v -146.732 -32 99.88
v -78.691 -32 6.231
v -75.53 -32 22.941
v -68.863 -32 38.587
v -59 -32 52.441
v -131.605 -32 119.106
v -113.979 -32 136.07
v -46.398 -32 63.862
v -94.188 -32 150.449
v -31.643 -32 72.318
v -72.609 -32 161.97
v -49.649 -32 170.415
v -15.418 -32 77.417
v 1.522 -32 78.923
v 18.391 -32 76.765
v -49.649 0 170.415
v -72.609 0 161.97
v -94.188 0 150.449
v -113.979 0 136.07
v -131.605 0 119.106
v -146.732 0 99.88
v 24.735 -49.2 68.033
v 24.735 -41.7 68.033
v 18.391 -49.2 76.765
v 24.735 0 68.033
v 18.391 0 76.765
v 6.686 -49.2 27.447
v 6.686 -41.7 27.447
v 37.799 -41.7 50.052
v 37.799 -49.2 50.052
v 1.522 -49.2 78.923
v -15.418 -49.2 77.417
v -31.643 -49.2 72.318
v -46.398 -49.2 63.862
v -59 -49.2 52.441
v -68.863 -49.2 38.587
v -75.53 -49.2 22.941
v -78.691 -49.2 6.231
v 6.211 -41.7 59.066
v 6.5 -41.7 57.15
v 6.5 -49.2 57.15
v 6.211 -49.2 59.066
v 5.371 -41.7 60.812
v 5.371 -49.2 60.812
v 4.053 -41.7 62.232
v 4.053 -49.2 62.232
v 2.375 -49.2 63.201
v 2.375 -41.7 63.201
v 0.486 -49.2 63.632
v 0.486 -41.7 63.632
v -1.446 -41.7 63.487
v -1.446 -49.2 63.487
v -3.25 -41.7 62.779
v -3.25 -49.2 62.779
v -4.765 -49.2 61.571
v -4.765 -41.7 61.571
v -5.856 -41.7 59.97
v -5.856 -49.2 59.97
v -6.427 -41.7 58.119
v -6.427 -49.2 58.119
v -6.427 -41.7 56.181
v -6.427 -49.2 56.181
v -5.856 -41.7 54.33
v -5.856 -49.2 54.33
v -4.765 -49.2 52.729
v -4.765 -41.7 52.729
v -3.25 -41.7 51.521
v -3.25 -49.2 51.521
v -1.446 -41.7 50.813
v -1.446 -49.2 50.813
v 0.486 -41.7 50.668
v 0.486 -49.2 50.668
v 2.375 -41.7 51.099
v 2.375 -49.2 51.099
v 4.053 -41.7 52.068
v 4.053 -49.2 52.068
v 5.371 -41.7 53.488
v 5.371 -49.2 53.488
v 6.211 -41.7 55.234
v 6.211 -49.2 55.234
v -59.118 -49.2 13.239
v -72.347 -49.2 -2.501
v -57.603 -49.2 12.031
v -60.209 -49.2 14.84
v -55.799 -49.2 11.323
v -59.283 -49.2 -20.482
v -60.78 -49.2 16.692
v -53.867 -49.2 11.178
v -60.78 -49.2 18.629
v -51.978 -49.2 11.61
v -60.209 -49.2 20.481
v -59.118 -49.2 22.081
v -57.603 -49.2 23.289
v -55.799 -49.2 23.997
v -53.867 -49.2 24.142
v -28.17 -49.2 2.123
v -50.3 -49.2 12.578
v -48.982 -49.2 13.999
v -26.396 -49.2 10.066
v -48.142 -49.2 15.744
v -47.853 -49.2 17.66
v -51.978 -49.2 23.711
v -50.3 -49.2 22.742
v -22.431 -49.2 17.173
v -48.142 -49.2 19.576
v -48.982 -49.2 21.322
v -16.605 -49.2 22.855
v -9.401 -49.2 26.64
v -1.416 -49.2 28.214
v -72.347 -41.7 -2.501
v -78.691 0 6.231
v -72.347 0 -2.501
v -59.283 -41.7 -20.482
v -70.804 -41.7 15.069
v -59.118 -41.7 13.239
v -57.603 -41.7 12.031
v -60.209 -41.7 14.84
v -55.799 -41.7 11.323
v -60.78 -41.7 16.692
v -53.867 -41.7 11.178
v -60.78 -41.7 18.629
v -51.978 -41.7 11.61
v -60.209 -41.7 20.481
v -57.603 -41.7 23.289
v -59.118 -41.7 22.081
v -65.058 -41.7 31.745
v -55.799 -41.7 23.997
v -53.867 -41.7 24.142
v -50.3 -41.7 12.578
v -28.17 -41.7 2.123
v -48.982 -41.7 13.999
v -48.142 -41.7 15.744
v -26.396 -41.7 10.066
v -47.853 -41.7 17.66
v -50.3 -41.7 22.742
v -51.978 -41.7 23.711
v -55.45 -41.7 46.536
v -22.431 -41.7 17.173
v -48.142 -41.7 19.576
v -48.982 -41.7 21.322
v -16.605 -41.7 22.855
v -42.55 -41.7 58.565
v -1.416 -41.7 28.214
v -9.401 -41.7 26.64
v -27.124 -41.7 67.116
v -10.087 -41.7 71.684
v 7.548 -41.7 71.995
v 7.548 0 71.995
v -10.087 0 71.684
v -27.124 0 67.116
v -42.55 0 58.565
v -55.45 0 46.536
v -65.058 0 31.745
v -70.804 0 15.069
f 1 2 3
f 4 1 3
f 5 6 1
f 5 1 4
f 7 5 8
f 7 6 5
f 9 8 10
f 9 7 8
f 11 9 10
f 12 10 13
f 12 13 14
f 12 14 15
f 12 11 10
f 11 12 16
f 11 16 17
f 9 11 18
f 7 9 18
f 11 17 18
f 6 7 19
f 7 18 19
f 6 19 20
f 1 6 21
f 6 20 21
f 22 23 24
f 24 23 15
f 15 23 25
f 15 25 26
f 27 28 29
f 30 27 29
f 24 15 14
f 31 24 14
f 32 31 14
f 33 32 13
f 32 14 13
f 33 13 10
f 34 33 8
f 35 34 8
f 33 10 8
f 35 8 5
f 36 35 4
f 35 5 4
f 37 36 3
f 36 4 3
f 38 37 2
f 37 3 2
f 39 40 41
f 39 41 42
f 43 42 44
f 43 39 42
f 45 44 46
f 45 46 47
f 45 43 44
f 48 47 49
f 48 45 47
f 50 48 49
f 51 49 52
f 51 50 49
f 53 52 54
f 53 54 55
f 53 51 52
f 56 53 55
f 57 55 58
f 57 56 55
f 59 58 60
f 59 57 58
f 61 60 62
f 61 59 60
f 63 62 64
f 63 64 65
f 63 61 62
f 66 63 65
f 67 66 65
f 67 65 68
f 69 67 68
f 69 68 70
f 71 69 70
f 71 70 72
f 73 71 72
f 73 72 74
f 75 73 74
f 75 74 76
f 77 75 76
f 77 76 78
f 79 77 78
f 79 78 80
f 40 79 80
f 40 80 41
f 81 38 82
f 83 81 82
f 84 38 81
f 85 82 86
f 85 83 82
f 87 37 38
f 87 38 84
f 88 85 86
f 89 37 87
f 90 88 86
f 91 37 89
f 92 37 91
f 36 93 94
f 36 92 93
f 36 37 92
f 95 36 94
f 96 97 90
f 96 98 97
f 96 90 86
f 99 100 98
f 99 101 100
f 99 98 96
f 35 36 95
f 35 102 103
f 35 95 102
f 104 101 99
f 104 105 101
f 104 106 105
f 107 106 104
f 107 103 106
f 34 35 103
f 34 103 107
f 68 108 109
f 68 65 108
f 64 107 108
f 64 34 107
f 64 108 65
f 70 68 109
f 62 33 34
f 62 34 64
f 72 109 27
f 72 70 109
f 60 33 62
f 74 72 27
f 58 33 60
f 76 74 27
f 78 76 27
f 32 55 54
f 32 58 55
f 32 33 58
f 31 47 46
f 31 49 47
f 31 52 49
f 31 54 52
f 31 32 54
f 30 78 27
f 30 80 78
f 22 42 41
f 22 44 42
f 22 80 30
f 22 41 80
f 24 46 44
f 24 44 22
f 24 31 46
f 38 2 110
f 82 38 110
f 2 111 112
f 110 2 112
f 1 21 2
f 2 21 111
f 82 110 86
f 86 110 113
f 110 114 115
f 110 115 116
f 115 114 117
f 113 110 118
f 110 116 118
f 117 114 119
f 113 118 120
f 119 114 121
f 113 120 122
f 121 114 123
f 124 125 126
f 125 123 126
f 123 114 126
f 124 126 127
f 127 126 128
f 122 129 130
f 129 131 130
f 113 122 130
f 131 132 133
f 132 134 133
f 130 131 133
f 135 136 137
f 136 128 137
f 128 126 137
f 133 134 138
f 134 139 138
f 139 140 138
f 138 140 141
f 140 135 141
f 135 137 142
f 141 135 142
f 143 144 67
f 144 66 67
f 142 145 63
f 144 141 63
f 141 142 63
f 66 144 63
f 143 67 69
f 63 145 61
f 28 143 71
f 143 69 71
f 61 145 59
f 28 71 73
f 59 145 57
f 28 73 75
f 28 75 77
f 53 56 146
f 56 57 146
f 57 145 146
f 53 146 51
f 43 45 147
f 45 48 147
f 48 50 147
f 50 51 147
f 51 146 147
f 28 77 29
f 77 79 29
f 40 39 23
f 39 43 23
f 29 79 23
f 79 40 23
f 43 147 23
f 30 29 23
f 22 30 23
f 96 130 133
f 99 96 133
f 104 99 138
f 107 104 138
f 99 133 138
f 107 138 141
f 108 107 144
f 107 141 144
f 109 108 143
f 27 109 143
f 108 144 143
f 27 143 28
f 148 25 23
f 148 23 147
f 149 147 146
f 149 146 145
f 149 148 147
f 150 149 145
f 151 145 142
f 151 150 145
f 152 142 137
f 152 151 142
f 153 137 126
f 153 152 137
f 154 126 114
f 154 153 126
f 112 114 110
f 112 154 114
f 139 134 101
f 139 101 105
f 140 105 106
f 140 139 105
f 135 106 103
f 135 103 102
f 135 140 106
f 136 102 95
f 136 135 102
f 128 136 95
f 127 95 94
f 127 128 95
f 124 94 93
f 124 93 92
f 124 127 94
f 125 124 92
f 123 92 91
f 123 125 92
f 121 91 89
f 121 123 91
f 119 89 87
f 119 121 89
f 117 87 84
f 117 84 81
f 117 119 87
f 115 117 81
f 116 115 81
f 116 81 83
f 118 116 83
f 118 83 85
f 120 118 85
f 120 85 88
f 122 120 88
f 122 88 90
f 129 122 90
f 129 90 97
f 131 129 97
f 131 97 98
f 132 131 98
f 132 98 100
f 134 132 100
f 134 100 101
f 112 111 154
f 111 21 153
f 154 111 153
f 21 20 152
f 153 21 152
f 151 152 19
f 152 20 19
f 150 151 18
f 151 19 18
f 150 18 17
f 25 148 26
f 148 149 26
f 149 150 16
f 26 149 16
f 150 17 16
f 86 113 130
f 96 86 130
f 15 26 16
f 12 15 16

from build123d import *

# Parameters (mm, degrees)
F0_R     = 6.5
F1_DEPTH = 49.2
F2_DEPTH = 32
F3_DEPTH = 41.7


with BuildPart() as f1:
    # F0 (on Front) → F1 (new body)
    with BuildSketch(Plane.XZ):
        with BuildLine():
            Line((24.735266, 68.032924), (18.390851, 76.765262))
            ThreePointArc((18.390851, 76.765262), (-46.398298, 63.861779), (-78.691188, 6.231032))
            Line((-78.691188, 6.231032), (-72.346773, -2.501307))
            ThreePointArc((-72.346773, -2.501307), (-42.549774, 58.56474), (24.735266, 68.032924))
        make_face()
        with BuildLine():
            Line((37.798947, 50.052309), (24.735266, 68.032924))
            ThreePointArc((24.735266, 68.032924), (-42.549774, 58.56474), (-72.346773, -2.501307))
            Line((-72.346773, -2.501307), (-59.283092, -20.481921))
            Line((-59.283092, -20.481921), (-28.170116, 2.122979))
            ThreePointArc((-28.170116, 2.122979), (-16.604933, 22.85473), (6.685972, 27.447409))
            Line((6.685972, 27.447409), (37.798947, 50.052309))
        make_face()
        with Locations((-54.35288, 17.660321)):
            Circle(F0_R, mode=Mode.SUBTRACT)
        with Locations((0, 57.15)):
            Circle(F0_R, mode=Mode.SUBTRACT)
    extrude(amount=F1_DEPTH)

    # F0 (on Front) → F2 (join)
    with BuildSketch(Plane.XZ):
        with BuildLine():
            Line((18.390851, 76.765262), (-49.64947, 170.41473))
            ThreePointArc((-49.64947, 170.41473), (-104.331882, 143.600517), (-146.731509, 99.8805))
            Line((-146.731509, 99.8805), (-78.691188, 6.231032))
            ThreePointArc((-78.691188, 6.231032), (-46.398298, 63.861779), (18.390851, 76.765262))
        make_face()
    extrude(amount=F2_DEPTH)

    # F0 (on Front) → F3 (cut)
    with BuildSketch(Plane.XZ):
        with BuildLine():
            Line((37.798947, 50.052309), (24.735266, 68.032924))
            ThreePointArc((24.735266, 68.032924), (-42.549774, 58.56474), (-72.346773, -2.501307))
            Line((-72.346773, -2.501307), (-59.283092, -20.481921))
            Line((-59.283092, -20.481921), (-28.170116, 2.122979))
            ThreePointArc((-28.170116, 2.122979), (-16.604933, 22.85473), (6.685972, 27.447409))
            Line((6.685972, 27.447409), (37.798947, 50.052309))
        make_face()
        with Locations((-54.35288, 17.660321)):
            Circle(F0_R, mode=Mode.SUBTRACT)
        with Locations((0, 57.15)):
            Circle(F0_R, mode=Mode.SUBTRACT)
    extrude(amount=F3_DEPTH, mode=Mode.SUBTRACT)


solid = f1.part
